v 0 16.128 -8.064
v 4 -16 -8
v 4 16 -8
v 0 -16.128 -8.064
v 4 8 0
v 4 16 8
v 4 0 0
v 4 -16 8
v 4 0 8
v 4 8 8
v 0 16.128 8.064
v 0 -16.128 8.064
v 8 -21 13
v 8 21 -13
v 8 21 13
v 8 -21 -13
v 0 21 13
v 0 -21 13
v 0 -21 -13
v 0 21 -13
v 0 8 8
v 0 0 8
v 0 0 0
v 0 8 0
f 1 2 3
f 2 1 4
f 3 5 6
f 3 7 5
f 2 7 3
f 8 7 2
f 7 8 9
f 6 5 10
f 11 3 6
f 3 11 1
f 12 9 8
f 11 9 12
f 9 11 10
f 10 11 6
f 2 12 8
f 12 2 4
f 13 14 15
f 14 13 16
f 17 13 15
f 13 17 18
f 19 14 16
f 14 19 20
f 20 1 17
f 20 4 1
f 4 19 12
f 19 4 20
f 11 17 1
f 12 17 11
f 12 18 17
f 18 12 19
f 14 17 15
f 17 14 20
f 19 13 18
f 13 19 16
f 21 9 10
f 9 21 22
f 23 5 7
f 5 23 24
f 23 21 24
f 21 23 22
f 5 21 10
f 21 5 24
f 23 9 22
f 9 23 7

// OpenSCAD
$fn=100;

hans_hak = 1; // don't make things too tight.

inside_width = 32; //81.61 + hans_hak; //13;
inside_height = 16; //57.24 + hans_hak; //12;
inside_length = 8;
thickness = 10;

x=8;
y=4;
z=1;
cube(x,y,z);

translate([inside_length/2, 0, 0])

difference ()
{
    difference()
    {
        union()
        {
            cube([inside_length , inside_width+ thickness, inside_height + thickness ], center=true);

        }
        // hollow out the innerds
        union()
        {

            #rotate([0,-90,0])
            linear_extrude(height=500, scale=2) square([inside_height, inside_width], center=true);

            // make sure there is a right wall to the box
            translate([-thickness, 0, 0])
            cube([inside_length, inside_width, inside_height], center=true);

        }
    }

    num_across = 3;
    num_down = 3;

    mid_across = num_across /2;
    mid_down = num_down /2;

    step = 5;

    //translate([inside_length/2 ,0, 0])
    for ( across = [0:1:num_across-1])
    {
        for (down = [0:1: num_down-1])
        {
            echo ("across", across, "  down", down);
            //echo ("acrossx", across - mid_across, "  down", down - mid_down);
            echo ("------");
            y = across * step - mid_across + 2;
            z = down * step - mid_down + 2;
            //echo ("y ", y, "  z", z);

            //rotate([0, -90, 0])
            //translate([ y ,  z, -inside_length/2 -1])
            //#cube([y-1, z-1, inside_length/2] , center = true);
        }
    }


}
